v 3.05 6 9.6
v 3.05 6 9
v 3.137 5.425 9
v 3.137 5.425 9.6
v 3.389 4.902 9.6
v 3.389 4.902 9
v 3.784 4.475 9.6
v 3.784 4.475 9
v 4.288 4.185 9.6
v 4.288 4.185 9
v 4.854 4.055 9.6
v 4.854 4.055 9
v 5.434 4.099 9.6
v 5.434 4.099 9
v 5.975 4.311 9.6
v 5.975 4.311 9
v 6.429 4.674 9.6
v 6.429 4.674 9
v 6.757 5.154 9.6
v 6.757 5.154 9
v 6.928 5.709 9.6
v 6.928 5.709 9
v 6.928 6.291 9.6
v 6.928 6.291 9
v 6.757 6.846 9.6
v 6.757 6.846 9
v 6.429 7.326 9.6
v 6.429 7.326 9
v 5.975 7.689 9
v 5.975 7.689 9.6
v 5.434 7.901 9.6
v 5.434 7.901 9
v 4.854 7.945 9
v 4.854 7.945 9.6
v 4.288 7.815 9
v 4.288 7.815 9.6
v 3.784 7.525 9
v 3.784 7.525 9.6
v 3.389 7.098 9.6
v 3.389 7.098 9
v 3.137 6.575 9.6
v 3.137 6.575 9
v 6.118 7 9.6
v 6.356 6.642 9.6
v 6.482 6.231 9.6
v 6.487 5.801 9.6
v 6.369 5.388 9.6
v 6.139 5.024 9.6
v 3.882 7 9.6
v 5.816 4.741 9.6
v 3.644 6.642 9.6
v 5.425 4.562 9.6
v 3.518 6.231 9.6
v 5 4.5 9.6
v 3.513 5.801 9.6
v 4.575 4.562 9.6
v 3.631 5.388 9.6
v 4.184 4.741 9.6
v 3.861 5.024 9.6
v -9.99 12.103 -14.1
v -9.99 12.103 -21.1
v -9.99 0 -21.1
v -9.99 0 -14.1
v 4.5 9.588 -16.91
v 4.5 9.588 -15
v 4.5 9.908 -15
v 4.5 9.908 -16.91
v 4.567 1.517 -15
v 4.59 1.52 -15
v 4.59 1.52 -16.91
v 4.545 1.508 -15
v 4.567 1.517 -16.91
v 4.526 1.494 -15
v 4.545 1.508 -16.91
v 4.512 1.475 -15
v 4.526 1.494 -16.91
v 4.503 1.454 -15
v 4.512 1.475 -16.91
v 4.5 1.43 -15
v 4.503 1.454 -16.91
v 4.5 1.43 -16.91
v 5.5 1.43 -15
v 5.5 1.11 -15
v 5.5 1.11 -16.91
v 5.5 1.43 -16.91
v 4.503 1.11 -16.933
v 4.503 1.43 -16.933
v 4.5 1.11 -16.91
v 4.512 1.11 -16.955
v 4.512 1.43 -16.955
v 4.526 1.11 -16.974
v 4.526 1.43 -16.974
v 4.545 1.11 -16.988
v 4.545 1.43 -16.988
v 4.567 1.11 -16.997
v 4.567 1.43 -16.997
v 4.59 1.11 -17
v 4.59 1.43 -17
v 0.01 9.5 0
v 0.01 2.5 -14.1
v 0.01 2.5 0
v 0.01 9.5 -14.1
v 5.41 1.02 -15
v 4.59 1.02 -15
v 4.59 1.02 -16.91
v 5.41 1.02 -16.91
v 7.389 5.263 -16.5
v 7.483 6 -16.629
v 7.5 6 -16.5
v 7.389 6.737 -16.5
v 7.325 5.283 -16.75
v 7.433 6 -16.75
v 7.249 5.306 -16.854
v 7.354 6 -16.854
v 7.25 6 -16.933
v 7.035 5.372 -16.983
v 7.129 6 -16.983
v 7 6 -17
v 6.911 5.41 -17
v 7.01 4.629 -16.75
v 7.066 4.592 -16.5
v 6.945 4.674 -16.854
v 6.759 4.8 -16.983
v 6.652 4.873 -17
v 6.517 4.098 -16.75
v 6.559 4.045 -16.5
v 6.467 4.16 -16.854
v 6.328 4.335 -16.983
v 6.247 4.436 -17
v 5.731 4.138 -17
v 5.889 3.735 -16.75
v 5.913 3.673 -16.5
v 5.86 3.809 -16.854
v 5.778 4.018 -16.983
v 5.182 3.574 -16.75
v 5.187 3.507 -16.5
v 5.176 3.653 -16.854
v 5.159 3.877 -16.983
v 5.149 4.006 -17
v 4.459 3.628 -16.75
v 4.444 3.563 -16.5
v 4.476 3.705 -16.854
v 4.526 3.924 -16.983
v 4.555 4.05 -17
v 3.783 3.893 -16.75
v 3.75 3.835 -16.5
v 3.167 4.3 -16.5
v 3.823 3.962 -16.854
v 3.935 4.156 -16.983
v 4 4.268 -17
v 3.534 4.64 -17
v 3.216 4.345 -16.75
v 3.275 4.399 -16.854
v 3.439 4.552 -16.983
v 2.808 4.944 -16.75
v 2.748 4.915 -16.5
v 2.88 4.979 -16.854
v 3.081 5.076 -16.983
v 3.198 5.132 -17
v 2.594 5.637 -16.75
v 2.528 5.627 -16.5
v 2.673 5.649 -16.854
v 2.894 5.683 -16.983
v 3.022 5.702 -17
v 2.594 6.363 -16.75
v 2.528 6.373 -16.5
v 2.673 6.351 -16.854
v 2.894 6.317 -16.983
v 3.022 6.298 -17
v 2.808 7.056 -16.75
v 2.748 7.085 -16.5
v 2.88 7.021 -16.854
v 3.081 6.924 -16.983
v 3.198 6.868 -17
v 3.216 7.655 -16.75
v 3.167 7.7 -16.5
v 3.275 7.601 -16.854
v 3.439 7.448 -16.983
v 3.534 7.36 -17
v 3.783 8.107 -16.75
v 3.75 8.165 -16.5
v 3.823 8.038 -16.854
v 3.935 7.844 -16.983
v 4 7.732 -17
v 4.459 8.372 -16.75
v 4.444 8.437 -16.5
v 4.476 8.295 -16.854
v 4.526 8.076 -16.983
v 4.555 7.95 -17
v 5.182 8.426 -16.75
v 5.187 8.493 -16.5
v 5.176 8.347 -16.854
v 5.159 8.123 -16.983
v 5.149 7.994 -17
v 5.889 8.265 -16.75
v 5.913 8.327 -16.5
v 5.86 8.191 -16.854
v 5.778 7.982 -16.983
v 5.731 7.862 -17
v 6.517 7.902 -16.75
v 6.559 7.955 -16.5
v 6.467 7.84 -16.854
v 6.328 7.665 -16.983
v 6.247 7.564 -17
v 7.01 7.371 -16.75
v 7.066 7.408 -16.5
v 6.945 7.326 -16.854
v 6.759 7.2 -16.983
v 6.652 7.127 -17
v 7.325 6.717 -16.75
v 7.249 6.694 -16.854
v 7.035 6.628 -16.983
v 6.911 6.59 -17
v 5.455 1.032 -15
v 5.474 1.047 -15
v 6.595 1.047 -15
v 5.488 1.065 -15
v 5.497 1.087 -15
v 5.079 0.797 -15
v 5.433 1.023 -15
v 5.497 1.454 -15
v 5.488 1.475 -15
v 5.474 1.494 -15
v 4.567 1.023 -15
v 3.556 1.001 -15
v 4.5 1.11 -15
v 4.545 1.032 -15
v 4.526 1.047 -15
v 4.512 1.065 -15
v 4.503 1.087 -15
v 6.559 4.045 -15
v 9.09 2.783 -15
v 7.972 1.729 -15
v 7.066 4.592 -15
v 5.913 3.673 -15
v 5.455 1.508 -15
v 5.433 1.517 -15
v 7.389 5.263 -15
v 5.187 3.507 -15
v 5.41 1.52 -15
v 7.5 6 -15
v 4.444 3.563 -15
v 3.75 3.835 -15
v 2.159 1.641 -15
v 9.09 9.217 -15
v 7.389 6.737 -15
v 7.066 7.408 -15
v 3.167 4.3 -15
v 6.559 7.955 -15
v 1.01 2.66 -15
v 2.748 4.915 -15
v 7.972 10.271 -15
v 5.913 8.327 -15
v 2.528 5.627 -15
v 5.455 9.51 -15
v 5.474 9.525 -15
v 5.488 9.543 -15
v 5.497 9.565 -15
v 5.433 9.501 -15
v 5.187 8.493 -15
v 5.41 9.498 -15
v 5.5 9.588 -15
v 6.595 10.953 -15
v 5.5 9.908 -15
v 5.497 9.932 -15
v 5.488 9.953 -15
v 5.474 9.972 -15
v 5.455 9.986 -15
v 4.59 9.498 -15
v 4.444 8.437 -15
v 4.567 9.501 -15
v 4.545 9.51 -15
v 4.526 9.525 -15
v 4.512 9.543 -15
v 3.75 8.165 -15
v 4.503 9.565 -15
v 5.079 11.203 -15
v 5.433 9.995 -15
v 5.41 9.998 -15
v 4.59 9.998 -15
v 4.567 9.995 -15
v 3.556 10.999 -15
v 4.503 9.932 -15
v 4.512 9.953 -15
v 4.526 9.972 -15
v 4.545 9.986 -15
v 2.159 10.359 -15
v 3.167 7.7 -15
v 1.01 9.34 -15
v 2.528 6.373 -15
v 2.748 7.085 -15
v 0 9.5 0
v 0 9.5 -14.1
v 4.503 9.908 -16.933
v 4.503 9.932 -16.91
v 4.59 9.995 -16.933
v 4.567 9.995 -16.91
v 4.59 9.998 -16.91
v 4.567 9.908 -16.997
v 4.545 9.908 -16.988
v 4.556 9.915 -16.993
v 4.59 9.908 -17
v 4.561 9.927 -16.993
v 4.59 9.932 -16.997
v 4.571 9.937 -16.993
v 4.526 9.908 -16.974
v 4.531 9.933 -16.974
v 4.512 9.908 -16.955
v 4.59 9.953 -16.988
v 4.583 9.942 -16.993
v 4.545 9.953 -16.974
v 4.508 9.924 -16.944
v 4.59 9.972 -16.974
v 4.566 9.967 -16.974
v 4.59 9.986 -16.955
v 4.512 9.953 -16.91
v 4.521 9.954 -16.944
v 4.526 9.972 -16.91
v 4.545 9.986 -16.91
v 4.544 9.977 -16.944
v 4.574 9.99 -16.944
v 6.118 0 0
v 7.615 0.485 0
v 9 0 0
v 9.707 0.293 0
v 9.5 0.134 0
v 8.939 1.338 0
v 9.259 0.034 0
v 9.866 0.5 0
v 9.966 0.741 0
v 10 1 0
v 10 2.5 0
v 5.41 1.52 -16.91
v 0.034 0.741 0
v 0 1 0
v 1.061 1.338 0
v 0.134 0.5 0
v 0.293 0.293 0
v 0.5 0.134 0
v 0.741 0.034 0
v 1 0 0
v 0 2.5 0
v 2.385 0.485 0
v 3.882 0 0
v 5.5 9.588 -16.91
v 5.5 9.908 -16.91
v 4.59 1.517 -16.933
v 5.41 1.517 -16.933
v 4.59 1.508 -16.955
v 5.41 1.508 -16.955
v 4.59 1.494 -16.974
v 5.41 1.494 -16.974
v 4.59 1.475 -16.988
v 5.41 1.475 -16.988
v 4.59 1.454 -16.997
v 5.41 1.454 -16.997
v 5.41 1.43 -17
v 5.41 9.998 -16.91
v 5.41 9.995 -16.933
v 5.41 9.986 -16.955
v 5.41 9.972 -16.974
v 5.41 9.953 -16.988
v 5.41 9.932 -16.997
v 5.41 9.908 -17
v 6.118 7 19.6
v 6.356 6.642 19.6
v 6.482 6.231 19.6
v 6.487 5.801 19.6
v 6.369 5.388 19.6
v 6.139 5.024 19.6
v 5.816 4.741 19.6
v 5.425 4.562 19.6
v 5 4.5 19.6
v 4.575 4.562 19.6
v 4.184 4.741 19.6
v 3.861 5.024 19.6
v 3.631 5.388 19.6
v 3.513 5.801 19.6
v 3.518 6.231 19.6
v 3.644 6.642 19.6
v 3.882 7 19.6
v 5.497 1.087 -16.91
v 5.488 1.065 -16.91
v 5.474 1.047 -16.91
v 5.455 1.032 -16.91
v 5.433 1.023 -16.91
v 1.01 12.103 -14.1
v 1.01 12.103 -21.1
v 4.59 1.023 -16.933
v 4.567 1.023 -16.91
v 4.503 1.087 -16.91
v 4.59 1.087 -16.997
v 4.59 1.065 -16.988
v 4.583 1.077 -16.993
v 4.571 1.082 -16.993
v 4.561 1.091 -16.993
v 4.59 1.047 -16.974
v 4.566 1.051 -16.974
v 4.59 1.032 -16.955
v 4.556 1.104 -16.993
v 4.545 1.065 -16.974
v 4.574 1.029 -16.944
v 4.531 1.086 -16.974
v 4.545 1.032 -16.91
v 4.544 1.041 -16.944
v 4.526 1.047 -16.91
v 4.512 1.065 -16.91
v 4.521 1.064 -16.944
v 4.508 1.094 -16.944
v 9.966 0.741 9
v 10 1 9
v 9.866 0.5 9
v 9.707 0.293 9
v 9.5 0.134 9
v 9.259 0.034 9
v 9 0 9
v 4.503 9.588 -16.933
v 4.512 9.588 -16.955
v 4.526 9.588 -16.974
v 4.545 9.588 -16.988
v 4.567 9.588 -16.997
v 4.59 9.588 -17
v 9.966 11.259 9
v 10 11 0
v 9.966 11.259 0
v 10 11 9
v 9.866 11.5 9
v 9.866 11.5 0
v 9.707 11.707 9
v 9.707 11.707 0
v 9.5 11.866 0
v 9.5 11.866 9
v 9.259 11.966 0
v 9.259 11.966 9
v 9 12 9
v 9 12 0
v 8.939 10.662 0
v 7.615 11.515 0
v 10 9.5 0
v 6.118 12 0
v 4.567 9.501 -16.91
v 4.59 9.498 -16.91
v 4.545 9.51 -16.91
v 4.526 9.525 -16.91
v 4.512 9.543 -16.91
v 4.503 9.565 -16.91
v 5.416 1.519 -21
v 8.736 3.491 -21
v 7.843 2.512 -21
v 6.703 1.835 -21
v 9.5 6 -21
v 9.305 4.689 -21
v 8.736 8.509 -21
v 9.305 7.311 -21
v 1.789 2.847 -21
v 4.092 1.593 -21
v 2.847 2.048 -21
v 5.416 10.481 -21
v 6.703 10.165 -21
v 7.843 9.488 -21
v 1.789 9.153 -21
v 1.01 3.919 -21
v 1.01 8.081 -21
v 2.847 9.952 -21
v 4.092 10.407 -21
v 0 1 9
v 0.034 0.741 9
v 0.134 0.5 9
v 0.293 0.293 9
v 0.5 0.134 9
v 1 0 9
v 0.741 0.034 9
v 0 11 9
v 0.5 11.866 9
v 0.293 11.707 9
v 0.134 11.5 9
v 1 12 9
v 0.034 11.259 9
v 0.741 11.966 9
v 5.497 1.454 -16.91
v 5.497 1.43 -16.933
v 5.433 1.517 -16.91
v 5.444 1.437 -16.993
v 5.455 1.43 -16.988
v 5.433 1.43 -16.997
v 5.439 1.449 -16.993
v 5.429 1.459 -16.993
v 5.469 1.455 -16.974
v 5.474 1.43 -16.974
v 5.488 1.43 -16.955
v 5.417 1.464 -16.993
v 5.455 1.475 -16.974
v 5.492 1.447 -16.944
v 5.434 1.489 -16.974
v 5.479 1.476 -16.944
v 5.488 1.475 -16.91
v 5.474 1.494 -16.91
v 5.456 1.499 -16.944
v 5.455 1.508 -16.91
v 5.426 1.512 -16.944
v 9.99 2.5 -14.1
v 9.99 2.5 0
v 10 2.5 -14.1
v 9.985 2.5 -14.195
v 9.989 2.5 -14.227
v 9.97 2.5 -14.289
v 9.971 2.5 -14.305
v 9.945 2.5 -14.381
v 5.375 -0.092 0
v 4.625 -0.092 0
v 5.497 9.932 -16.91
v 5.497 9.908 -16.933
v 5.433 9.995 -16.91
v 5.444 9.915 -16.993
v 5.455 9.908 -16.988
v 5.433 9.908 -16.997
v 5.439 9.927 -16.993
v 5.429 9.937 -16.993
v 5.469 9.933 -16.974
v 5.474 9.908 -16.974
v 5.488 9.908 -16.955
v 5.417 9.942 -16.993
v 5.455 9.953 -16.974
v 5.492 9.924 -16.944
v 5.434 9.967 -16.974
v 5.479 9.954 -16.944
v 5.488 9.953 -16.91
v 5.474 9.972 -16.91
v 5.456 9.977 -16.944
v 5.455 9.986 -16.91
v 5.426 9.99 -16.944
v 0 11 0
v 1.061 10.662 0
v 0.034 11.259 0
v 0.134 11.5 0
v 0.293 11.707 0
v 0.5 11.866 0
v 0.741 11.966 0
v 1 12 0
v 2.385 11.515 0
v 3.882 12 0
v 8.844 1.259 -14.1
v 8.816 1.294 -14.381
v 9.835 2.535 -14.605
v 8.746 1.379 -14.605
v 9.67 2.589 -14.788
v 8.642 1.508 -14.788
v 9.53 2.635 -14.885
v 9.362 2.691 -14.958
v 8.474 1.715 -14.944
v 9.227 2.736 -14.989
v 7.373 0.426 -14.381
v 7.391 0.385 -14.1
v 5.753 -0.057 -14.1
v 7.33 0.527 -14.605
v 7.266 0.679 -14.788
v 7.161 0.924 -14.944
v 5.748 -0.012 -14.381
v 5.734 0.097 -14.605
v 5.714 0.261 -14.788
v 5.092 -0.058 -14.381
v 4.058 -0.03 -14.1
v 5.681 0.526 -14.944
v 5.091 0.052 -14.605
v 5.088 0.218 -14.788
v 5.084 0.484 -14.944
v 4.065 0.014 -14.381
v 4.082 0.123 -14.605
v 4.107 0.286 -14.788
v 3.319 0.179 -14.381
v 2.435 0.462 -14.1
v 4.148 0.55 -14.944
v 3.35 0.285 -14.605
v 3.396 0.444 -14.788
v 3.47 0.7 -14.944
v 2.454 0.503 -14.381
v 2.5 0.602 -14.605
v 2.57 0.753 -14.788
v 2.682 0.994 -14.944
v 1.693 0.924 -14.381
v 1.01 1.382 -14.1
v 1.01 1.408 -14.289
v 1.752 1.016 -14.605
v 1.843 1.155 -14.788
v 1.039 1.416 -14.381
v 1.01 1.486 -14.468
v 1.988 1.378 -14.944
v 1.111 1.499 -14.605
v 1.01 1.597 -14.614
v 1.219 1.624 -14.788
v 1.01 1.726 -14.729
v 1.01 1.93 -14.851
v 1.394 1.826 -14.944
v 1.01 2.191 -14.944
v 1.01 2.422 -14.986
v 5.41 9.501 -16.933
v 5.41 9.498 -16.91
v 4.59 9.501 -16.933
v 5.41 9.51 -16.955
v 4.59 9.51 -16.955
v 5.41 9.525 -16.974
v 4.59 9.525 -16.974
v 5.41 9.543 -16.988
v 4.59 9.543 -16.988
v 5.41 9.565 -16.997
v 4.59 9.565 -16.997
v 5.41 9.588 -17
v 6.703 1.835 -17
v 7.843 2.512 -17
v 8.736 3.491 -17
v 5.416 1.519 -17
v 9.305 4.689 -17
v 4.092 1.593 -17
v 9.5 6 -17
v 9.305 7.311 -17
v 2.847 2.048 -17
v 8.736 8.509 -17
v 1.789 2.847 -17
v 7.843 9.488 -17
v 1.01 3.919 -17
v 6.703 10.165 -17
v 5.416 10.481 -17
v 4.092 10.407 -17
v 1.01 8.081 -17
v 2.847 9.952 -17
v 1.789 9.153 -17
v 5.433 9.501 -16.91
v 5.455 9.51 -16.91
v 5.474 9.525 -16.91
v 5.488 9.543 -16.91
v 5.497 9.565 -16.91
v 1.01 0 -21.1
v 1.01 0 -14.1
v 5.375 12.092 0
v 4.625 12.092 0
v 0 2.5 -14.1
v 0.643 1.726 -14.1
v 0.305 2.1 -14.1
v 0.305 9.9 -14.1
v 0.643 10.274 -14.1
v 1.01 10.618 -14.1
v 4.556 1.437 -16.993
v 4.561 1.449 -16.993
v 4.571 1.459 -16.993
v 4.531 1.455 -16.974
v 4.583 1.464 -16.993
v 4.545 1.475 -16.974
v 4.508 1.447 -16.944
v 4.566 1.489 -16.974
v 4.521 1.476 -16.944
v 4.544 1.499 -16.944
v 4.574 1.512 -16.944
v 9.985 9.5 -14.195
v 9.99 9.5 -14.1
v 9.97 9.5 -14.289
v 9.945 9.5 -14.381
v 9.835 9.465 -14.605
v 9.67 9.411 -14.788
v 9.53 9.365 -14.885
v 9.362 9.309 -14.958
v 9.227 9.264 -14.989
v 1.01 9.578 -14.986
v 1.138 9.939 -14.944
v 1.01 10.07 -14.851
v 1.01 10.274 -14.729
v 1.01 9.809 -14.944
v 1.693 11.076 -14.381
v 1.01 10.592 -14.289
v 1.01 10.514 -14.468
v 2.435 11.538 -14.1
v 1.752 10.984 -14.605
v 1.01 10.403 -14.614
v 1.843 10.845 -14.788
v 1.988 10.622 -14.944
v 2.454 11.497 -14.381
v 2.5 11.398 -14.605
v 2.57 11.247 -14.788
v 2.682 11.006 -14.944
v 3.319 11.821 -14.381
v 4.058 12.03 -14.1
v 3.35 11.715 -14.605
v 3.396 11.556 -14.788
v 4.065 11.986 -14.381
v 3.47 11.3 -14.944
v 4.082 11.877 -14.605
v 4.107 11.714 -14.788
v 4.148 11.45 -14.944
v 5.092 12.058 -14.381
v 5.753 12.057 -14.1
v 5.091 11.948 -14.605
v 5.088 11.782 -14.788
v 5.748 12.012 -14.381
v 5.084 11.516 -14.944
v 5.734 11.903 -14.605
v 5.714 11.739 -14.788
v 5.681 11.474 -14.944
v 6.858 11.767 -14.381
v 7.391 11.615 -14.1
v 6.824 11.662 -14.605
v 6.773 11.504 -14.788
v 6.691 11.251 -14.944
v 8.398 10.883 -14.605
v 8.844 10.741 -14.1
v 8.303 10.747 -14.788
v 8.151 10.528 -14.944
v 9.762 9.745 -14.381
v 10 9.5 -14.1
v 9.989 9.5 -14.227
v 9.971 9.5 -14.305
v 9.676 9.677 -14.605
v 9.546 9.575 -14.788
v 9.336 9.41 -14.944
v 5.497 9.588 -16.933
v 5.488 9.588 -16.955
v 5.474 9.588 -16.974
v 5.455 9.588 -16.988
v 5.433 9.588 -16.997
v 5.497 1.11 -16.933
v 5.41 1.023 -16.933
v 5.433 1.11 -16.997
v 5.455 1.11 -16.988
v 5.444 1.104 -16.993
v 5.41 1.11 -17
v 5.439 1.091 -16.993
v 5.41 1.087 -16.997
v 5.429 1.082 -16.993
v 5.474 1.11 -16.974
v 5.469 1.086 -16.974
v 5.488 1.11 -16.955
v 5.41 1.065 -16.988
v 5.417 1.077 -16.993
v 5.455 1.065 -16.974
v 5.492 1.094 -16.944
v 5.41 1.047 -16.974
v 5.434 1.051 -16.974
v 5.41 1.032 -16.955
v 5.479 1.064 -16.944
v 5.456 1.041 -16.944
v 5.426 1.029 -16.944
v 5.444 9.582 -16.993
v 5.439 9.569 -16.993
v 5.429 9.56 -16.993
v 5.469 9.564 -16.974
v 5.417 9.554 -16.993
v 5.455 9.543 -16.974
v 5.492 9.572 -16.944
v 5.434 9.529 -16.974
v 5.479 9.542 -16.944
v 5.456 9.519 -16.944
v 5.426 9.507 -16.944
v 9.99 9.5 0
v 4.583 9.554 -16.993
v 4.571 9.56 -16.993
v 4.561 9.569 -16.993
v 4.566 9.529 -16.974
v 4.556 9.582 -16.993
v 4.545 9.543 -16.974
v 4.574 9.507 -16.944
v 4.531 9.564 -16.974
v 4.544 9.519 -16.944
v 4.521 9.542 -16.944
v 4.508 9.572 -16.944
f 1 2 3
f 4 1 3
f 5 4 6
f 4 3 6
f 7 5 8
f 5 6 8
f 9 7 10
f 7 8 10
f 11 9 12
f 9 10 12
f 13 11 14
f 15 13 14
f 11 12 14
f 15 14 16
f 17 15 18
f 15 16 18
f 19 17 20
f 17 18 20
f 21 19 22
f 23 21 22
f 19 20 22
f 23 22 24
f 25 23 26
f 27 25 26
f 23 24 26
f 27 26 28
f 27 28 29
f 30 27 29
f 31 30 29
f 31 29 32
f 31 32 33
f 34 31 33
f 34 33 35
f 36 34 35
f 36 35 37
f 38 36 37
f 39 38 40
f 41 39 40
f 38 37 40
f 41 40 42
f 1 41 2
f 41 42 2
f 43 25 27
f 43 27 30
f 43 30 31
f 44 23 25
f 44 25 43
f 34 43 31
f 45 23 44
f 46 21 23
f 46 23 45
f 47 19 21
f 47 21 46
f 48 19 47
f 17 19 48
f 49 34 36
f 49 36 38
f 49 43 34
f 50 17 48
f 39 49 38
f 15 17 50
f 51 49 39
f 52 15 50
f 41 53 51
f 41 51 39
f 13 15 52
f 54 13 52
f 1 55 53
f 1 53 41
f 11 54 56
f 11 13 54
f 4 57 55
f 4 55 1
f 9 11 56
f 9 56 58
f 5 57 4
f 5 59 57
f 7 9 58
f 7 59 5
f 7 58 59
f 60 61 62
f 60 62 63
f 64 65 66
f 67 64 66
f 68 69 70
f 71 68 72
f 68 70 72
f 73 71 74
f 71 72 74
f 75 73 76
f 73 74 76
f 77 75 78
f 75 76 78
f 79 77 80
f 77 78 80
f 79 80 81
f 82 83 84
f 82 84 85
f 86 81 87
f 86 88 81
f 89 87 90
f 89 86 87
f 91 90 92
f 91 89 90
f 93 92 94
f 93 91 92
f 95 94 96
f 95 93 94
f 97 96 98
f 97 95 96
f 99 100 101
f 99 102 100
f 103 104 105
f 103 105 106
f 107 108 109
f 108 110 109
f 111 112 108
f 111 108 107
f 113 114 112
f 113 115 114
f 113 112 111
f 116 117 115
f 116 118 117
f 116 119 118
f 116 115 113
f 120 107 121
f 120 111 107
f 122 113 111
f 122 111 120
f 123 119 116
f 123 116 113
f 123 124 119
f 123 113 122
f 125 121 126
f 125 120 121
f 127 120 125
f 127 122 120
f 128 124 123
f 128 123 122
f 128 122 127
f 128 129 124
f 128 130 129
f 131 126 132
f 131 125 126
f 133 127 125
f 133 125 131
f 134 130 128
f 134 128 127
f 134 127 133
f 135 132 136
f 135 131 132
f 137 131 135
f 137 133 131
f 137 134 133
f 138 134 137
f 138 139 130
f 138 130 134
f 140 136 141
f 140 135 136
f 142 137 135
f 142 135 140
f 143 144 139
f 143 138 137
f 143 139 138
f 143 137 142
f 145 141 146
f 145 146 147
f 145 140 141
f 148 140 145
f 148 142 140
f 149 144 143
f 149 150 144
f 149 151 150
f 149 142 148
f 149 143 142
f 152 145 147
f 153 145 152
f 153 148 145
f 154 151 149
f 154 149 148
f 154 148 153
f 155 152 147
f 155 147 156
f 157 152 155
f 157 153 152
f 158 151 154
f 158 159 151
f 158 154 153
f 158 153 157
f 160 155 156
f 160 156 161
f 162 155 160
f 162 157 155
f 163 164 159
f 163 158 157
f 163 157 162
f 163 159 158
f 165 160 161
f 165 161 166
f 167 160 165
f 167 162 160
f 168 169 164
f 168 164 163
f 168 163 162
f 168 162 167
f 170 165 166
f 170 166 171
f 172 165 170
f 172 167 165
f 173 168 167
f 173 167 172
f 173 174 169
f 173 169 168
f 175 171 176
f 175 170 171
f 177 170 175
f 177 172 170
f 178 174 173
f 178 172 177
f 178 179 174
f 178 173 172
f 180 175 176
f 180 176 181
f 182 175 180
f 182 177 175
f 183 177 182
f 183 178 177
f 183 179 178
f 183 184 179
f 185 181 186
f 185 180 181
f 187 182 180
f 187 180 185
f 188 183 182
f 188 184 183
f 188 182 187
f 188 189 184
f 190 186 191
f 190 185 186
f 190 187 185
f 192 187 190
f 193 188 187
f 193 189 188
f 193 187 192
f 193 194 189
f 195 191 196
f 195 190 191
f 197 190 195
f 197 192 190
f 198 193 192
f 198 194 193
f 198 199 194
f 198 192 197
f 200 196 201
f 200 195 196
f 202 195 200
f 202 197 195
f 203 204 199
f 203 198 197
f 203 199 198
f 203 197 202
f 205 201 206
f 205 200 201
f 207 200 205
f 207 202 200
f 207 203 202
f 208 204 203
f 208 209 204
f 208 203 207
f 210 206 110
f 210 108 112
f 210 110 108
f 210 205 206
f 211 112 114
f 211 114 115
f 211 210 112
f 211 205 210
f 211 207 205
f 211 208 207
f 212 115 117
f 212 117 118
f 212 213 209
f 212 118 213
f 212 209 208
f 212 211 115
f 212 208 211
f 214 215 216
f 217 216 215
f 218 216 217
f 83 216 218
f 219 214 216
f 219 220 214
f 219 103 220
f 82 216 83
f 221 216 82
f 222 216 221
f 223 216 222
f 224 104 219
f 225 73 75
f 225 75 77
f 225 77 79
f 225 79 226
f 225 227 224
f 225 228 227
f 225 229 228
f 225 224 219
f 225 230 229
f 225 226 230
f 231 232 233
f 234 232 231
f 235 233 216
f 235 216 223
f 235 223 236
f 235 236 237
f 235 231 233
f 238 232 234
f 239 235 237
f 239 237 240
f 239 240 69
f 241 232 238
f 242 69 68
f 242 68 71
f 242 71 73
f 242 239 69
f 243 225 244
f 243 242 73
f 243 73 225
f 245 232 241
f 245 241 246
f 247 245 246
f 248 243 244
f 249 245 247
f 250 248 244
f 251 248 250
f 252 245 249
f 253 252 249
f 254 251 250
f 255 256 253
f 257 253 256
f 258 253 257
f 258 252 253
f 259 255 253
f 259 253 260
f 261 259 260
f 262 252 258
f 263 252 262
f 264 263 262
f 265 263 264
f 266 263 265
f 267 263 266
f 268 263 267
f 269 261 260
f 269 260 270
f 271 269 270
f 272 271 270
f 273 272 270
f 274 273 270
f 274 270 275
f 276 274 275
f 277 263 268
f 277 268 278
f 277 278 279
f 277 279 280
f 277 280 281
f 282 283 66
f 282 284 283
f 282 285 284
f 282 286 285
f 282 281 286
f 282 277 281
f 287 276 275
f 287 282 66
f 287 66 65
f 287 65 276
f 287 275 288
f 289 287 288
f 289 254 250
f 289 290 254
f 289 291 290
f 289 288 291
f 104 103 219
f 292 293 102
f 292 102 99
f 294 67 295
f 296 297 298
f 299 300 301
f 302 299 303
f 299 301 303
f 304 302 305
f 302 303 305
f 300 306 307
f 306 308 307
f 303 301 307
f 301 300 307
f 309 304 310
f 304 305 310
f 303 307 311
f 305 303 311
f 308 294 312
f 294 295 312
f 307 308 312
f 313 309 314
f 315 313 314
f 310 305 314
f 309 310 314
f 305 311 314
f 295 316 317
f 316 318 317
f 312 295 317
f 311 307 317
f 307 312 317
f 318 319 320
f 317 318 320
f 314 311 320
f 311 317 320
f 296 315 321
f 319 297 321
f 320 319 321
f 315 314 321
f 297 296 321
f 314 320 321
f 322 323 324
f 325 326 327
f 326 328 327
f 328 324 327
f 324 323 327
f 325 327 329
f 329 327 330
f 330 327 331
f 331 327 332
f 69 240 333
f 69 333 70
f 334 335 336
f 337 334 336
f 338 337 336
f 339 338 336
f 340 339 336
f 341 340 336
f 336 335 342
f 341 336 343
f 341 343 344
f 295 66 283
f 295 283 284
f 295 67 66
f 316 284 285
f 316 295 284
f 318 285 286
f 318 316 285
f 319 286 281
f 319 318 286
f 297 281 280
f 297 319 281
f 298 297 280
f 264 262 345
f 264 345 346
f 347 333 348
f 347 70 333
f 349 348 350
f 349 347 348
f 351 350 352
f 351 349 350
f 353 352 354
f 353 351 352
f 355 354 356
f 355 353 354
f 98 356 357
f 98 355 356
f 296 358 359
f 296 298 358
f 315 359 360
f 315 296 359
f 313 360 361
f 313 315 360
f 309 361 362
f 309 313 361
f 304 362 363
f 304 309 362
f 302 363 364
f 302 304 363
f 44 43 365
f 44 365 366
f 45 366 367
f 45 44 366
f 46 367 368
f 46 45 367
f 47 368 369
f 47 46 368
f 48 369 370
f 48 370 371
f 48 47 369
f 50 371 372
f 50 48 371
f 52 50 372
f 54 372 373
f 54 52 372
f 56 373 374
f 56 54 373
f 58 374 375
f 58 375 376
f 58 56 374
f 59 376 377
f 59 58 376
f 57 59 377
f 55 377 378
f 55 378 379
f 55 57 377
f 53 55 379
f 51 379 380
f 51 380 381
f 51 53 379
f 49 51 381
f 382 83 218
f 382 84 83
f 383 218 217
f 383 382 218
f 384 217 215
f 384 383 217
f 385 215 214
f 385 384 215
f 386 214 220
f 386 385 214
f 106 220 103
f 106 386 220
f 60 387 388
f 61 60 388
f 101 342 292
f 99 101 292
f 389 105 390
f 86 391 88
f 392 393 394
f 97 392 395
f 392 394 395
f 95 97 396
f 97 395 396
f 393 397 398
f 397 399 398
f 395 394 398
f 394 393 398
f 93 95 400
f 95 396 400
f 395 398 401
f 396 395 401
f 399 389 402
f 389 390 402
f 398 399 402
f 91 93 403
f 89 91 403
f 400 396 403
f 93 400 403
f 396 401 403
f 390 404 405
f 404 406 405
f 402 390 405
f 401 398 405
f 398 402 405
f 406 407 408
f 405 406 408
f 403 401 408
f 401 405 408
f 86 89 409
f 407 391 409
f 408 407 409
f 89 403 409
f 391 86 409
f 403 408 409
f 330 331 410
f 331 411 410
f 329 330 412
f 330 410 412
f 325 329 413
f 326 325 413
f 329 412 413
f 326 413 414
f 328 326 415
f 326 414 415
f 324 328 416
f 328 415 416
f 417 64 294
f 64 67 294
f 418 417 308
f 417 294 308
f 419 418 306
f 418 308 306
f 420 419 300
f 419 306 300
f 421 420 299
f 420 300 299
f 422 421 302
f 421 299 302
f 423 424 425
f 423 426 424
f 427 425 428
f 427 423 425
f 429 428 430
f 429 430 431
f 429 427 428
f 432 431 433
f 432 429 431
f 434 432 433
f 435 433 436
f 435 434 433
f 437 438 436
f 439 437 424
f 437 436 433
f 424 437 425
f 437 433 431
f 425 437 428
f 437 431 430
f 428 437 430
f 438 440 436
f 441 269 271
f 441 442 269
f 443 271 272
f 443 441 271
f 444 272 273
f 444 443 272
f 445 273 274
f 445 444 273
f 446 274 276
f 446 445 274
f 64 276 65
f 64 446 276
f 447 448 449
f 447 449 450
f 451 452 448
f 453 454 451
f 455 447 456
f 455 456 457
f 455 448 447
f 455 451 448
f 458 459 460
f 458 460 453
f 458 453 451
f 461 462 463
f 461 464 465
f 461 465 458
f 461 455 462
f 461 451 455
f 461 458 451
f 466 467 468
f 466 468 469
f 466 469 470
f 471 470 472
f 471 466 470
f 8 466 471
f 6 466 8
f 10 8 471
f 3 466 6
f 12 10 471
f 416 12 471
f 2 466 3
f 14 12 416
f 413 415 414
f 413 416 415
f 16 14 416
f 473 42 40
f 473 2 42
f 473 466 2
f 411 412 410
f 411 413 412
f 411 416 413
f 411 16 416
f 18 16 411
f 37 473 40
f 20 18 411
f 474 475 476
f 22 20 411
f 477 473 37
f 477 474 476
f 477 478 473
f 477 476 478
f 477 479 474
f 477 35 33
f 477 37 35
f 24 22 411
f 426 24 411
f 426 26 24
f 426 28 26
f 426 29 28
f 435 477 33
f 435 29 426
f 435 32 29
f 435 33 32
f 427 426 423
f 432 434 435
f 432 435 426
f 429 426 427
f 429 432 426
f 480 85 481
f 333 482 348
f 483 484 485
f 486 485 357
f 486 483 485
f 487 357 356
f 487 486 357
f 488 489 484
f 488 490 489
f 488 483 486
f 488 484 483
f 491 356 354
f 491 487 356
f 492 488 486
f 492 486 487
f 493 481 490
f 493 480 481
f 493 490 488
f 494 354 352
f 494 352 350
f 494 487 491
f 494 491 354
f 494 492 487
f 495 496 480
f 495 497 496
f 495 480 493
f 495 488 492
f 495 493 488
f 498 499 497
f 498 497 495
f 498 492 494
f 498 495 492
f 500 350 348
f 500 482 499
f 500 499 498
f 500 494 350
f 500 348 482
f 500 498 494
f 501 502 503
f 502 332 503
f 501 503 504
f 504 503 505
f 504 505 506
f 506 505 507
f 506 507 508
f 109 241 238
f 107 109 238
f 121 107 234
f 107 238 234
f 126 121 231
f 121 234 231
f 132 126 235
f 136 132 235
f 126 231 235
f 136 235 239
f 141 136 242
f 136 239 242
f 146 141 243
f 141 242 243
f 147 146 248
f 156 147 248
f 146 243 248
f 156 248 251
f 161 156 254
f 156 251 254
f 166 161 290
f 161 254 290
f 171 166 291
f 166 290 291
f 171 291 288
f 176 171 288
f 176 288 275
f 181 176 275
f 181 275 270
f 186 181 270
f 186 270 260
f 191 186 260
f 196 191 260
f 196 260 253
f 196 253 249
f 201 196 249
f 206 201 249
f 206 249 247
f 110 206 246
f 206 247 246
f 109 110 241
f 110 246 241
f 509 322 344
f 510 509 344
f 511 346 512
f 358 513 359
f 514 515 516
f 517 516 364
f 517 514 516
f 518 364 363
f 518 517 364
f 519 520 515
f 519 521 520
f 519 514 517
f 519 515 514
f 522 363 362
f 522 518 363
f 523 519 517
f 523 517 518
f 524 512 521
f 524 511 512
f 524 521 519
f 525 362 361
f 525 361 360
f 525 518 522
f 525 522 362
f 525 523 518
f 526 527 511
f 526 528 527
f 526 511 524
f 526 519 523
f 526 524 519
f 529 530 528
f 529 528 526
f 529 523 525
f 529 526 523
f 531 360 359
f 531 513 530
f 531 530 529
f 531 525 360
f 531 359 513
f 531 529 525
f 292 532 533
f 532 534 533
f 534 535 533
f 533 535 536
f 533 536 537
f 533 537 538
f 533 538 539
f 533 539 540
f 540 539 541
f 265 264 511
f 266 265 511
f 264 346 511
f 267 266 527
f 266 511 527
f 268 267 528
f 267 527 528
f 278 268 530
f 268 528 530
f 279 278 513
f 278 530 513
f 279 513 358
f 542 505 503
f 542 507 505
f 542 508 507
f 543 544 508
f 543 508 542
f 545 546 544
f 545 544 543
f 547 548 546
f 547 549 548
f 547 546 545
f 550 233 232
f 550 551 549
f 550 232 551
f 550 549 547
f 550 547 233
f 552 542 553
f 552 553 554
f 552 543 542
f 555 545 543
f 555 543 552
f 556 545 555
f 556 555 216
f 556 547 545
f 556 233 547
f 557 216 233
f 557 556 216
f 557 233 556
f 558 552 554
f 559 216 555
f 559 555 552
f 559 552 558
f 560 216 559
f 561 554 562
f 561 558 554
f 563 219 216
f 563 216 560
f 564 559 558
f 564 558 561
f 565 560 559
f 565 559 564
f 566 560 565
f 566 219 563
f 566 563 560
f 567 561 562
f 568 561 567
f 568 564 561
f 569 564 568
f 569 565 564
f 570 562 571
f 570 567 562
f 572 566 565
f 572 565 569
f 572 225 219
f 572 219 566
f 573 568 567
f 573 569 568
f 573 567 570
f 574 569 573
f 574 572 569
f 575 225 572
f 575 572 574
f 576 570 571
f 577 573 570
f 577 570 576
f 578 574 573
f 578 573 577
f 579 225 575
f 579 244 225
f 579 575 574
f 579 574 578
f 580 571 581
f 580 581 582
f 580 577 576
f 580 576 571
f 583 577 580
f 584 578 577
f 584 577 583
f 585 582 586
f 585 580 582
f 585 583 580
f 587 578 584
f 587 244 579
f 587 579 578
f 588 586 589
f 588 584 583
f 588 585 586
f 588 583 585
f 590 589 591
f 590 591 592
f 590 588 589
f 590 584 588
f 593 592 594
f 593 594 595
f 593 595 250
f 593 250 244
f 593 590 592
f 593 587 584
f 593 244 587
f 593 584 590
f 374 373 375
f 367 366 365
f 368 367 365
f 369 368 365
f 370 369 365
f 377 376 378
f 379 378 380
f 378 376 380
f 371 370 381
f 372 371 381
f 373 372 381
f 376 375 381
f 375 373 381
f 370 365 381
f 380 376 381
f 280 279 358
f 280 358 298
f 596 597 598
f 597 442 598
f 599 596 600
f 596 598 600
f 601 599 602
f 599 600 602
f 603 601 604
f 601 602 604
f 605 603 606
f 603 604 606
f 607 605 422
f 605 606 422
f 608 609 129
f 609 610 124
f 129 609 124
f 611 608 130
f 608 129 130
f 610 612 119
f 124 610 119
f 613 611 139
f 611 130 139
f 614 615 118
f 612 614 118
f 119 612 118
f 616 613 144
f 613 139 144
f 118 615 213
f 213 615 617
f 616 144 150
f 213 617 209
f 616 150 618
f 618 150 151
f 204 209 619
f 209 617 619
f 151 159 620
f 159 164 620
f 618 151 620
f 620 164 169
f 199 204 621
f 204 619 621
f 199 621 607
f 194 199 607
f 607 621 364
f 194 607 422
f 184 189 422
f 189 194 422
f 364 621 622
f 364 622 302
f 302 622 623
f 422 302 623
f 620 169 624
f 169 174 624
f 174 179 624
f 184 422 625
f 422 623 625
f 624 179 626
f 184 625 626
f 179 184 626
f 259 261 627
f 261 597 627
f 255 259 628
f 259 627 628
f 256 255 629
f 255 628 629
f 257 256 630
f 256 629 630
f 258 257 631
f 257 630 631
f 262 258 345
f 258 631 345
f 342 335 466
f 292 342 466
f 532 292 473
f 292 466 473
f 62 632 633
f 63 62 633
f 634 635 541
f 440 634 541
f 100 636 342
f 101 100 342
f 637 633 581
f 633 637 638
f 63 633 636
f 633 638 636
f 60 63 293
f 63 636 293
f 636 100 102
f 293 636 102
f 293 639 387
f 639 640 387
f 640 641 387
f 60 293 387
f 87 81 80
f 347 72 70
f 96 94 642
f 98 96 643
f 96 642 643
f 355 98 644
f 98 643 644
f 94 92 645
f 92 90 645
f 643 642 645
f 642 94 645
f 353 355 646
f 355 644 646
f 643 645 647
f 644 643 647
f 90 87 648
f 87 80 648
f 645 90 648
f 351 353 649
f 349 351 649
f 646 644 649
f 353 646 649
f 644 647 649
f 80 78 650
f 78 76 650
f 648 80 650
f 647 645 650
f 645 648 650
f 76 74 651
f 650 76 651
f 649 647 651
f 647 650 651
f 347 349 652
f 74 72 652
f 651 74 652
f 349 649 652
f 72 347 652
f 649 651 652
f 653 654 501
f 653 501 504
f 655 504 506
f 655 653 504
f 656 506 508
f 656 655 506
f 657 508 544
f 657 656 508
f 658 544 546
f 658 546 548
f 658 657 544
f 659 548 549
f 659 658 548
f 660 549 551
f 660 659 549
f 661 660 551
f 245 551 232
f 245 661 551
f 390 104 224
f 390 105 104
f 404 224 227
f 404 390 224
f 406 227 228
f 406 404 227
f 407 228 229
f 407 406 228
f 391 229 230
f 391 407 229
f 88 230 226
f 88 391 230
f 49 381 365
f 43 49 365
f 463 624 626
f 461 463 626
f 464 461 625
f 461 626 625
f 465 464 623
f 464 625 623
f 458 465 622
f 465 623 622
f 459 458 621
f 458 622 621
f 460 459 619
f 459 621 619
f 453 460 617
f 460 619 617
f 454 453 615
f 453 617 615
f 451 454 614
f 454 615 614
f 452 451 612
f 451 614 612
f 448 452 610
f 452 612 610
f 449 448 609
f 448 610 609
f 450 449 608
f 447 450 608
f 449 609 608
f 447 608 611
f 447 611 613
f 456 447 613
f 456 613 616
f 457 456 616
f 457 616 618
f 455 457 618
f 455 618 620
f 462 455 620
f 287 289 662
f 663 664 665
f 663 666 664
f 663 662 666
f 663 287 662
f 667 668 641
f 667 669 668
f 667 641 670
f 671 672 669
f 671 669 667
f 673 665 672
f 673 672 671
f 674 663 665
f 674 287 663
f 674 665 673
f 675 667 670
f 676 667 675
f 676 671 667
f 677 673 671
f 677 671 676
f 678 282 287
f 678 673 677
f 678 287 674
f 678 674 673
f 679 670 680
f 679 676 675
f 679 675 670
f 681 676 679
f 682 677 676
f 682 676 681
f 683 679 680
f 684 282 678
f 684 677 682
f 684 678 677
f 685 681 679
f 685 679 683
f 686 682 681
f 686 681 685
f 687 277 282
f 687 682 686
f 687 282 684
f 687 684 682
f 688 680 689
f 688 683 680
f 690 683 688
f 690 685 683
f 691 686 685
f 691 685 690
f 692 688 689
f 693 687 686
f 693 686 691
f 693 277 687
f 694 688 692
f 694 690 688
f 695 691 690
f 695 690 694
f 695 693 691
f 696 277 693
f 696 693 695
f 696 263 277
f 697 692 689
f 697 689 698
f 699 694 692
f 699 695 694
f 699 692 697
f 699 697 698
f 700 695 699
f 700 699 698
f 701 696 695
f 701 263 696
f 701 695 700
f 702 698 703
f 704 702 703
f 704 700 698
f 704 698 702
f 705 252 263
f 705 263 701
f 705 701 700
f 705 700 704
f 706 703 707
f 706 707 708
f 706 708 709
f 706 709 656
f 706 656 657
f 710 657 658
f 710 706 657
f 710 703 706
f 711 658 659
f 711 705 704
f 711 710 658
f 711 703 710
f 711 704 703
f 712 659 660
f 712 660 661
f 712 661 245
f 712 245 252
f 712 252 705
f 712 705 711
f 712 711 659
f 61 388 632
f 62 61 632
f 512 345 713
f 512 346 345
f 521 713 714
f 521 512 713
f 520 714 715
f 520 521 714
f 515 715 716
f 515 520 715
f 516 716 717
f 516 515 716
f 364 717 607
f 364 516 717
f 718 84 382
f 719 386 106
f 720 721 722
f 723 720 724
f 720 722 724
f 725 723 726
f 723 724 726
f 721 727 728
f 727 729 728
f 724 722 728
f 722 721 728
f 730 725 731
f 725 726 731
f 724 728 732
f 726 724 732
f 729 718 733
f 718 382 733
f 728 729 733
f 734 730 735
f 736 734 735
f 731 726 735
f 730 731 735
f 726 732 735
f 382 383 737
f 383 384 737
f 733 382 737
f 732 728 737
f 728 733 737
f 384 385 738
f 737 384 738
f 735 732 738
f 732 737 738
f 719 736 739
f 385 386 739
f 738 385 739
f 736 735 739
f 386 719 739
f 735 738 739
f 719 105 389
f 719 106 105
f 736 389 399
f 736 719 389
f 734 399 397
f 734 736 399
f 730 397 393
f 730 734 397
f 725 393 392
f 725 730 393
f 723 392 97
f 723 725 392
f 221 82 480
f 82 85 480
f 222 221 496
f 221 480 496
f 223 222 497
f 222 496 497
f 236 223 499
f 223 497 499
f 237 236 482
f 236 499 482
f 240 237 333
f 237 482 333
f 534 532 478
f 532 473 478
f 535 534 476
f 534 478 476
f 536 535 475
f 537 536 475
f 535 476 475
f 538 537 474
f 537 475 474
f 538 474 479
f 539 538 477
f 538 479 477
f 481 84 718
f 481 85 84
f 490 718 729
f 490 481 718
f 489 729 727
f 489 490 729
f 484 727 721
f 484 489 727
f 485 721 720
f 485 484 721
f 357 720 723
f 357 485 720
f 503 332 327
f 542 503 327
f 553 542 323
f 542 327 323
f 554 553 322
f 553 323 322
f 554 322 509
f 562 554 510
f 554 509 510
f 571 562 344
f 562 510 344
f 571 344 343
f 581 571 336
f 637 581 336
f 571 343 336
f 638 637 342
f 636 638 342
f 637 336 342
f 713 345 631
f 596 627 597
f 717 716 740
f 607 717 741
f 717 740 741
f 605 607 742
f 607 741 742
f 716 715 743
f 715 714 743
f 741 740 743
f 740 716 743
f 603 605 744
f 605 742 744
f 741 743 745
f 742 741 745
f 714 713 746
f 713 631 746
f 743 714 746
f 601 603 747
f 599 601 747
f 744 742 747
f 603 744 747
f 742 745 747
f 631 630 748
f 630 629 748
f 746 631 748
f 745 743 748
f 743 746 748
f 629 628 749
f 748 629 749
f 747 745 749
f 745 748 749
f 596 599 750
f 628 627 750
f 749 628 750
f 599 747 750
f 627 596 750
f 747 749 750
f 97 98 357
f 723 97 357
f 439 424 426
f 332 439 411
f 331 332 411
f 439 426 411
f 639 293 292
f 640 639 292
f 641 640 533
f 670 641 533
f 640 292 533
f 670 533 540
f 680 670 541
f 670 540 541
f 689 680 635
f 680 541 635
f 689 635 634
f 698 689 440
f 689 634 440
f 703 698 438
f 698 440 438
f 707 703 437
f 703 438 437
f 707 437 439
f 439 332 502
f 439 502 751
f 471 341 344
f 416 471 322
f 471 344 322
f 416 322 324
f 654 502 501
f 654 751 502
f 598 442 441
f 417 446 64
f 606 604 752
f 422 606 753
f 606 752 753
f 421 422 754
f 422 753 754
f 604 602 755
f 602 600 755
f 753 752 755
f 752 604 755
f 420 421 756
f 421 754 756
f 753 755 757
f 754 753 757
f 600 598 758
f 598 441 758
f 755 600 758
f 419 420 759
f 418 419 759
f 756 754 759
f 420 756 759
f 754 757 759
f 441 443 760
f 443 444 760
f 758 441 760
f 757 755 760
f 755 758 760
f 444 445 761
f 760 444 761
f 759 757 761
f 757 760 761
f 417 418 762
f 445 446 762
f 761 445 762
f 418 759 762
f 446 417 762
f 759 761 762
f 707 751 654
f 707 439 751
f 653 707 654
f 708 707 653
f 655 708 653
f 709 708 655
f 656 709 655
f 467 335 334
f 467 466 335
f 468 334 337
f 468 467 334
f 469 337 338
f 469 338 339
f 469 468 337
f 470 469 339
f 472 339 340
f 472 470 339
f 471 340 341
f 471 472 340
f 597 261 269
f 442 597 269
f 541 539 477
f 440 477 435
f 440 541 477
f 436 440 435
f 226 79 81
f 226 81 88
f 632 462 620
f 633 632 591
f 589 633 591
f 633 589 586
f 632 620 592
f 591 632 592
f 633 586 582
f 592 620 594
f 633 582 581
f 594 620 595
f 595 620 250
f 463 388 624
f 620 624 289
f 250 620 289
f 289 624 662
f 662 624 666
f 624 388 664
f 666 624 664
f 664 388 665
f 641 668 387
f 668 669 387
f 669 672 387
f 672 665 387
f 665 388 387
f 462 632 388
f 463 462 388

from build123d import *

# Parameters (mm, degrees)
CROQUIS1_W               = 10
CROQUIS1_H               = 12
SALIENTE_EXTRUIR1_DEPTH  = 9
SALIENTE_EXTRUIR2_DEPTH  = 15
CROQUIS3_W               = 1
CROQUIS3_H               = 0.5
SALIENTE_EXTRUIR3_DEPTH  = 2
CROQUIS4_R               = 2.5000000000000004
SALIENTE_EXTRUIR4_DEPTH  = 2
CROQUIS5_R               = 1.95
SALIENTE_EXTRUIR5_DEPTH  = 0.6
SALIENTE_EXTRUIR9_DEPTH  = 10
CROQUIS7_W               = 15.000000000000002
CROQUIS7_H               = 7.000000000000002
CORTAR_EXTRUIR1_DEPTH    = 0.01
CROQUIS8_W               = 15.000000000000002
CROQUIS8_H               = 7.0000000000000036
CORTAR_EXTRUIR2_DEPTH    = 0.01
REDONDEO1_R              = 0.9
REDONDEO2_R              = 0.9
REDONDEO3_R              = 0.5
CROQUIS9_R               = 0.4628353533662974
SALIENTE_EXTRUIR7_DEPTH  = 0.01
REDONDEO4_R              = 0.09
REDONDEO6_R              = 1
SKETCH2_R                = 4.5
BOSS_EXTRUDE1_DEPTH      = 4
BOSS_EXTRUDE3_DEPTH      = 10
BOSS_EXTRUDE3_DEPTH_BACK = 1


with BuildPart() as part:
    # Croquis1 → Saliente-Extruir1 (new body)
    with BuildSketch(Plane.XY):
        with Locations((5, 6)):
            Rectangle(CROQUIS1_W, CROQUIS1_H)
    extrude(amount=SALIENTE_EXTRUIR1_DEPTH)

    # Croquis2 → Saliente-Extruir2 (add)
    with BuildSketch(Plane(origin=(0, 0, 0), x_dir=(-1, 0, 0), z_dir=(0, 0, -1))):
        with BuildLine():
            Line((-10, 9.5), (-10, 2.5))
            ThreePointArc((-10, 2.5), (-5, -0.10327780786685103), (0, 2.5000000000000004))
            Line((0, 2.5000000000000004), (0, 9.5))
            ThreePointArc((0, 9.5), (-5, 12.103277807866851), (-10, 9.5))
        make_face()
    extrude(amount=SALIENTE_EXTRUIR2_DEPTH)

    # Croquis3 → Saliente-Extruir3 (add)
    with BuildSketch(Plane(origin=(0, 0, -15), x_dir=(-1, 0, 0), z_dir=(0, 0, -1))):
        with Locations((-5.000000000000001, 9.748277807866852)):
            Rectangle(CROQUIS3_W, CROQUIS3_H)
        Polygon((-5.499999999999999, 1.520287769635288), (-4.499999999999999, 1.5202877696352886), (-4.499999999999999, 1.020287769635288), (-5.499999999999999, 1.020287769635288), align=None)
    extrude(amount=SALIENTE_EXTRUIR3_DEPTH)

    # Croquis4 → Saliente-Extruir4 (add)
    with BuildSketch(Plane(origin=(0, 0, -15), x_dir=(-1, 0, 0), z_dir=(0, 0, -1))):
        with Locations(Location((-5, 6, 0), (0, 0, 180))):
            Circle(CROQUIS4_R)
    extrude(amount=SALIENTE_EXTRUIR4_DEPTH)

    # Croquis5 → Saliente-Extruir5 (add)
    with BuildSketch(Plane.XY.offset(9)):
        with Locations(Location((5, 6, 0), (0, 0, 180))):
            Circle(CROQUIS5_R)
    extrude(amount=SALIENTE_EXTRUIR5_DEPTH)

    # Croquis6 → Saliente-Extruir9 (add)
    with BuildSketch(Plane.XY.offset(9.6)):
        with BuildLine():
            Line((3.8819660112501033, 6.999999999999999), (6.118033988749897, 6.999999999999999))
            ThreePointArc((6.118033988749897, 6.999999999999999), (5, 4.499999999999999), (3.8819660112501033, 6.999999999999999))
        make_face()
    extrude(amount=SALIENTE_EXTRUIR9_DEPTH)

    # Croquis7 → Cortar-Extruir1 (cut)
    with BuildSketch(Plane(origin=(10, 0, 0), x_dir=(0, 0, -1), z_dir=(1, 0, 0))):
        with Locations((7.500000000000001, 5.999999999999999)):
            Rectangle(CROQUIS7_W, CROQUIS7_H)
    extrude(amount=-CORTAR_EXTRUIR1_DEPTH, mode=Mode.SUBTRACT)

    # Croquis8 → Cortar-Extruir2 (cut)
    with BuildSketch(Plane.ZY):
        with Locations((-7.500000000000001, 5.999999999999998)):
            Rectangle(CROQUIS8_W, CROQUIS8_H)
    extrude(amount=-CORTAR_EXTRUIR2_DEPTH, mode=Mode.SUBTRACT)

    # Redondeo1
    redondeo1_edges = [part.edges().sort_by_distance(p)[0] for p in [
        (9.99, 6, -15),
        (0.01, 5.999999999999998, -15),
    ]]
    fillet(redondeo1_edges, radius=REDONDEO1_R)

    # Redondeo2
    # the kernel refuses this fillet: 0.9 mm, written as the material it takes off along each edge
    with BuildSketch(Plane(origin=(5, 6.000000000000001, -15), x_dir=(-0.9708964954680348, 0.23949946782381015, 0), z_dir=(-0.23949946782381015, -0.9708964954680348, 0))) as redondeo2_piece_1:
        with BuildLine():
            CenterArc((6.103277807866849 - REDONDEO2_R, -REDONDEO2_R), REDONDEO2_R, 0, 90)
            Line((6.103277807866849, -REDONDEO2_R), (6.103277807866849, 0))
            Line((6.103277807866849, 0), (6.103277807866849 - REDONDEO2_R, 0))
        make_face()
    revolve(axis=Axis((5, 6.000000000000001, -15), (0, 0, -1)), revolution_arc=152.28599911771772, mode=Mode.SUBTRACT)
    with BuildSketch(Plane(origin=(5, 6, -15), x_dir=(0.9708964954680347, -0.23949946782381032, 0), z_dir=(0.23949946782381032, 0.9708964954680347, 0))) as redondeo2_piece_2:
        with BuildLine():
            CenterArc((6.103277807866849 - REDONDEO2_R, -REDONDEO2_R), REDONDEO2_R, 0, 90)
            Line((6.103277807866849 - REDONDEO2_R, 0), (6.103277807866849, 0))
            Line((6.103277807866849, 0), (6.103277807866849, -REDONDEO2_R))
        make_face()
    revolve(axis=Axis((5, 6, -15), (0, 0, -1)), revolution_arc=152.2859991177177, mode=Mode.SUBTRACT)

    # Redondeo3
    redondeo3_edges = [part.edges().sort_by_distance(p)[0] for p in [
        (2.4999999999999996, 5.999999999999999, -17),
    ]]
    fillet(redondeo3_edges, radius=REDONDEO3_R)

    # Croquis9 → Saliente-Extruir7 (add)
    with BuildSketch(Plane(origin=(0, 0, -17), x_dir=(-1, 0, 0), z_dir=(0, 0, -1))):
        with Locations((-5, 6)):
            Circle(CROQUIS9_R)
    extrude(amount=SALIENTE_EXTRUIR7_DEPTH)

    # Redondeo4
    redondeo4_edges = [part.edges().sort_by_distance(p)[0] for p in [
        (5.500000000000001, 9.998277807866852, -16),
        (5.500000000000001, 9.498277807866852, -16),
        (4.500000000000001, 9.498277807866852, -16),
        (4.500000000000001, 9.998277807866852, -16),
        (5.500000000000001, 9.748277807866852, -17),
        (5.000000000000001, 9.498277807866852, -17),
        (4.500000000000001, 9.748277807866852, -17),
        (5.000000000000001, 9.998277807866852, -17),
        (5.499999999999999, 1.520287769635288, -16),
        (5.499999999999999, 1.020287769635288, -16),
        (4.499999999999999, 1.020287769635288, -16),
        (4.499999999999999, 1.5202877696352886, -16),
        (5.499999999999999, 1.270287769635288, -17),
        (4.999999999999999, 1.020287769635288, -17),
        (4.499999999999999, 1.2702877696352883, -17),
        (4.999999999999999, 1.5202877696352883, -17),
    ]]
    fillet(redondeo4_edges, radius=REDONDEO4_R)

    # Redondeo6
    redondeo6_edges = [part.edges().sort_by_distance(p)[0] for p in [
        (10, 12, 4.5),
        (10, 0, 4.5),
        (0, 0, 4.5),
        (0, 12, 4.5),
    ]]
    fillet(redondeo6_edges, radius=REDONDEO6_R)

    # Sketch2 → Boss-Extrude1 (add)
    with BuildSketch(Plane(origin=(0, 0, -17), x_dir=(-1, 0, 0), z_dir=(0, 0, -1))):
        with Locations((-5, 6)):
            Circle(SKETCH2_R)
    extrude(amount=BOSS_EXTRUDE1_DEPTH)

    # Sketch3 → Boss-Extrude3 (add, two sides: drawn at the far end of the back side and taken through both)
    with BuildSketch(Plane.ZY.offset(-0.01).offset(-BOSS_EXTRUDE3_DEPTH_BACK)):
        Polygon((-14.100000000000003, 12.103277807866851), (-21.100000000000005, 12.103277807866851), (-21.1, 0), (-14.100000000000003, 0), align=None)
    extrude(amount=BOSS_EXTRUDE3_DEPTH + BOSS_EXTRUDE3_DEPTH_BACK)


solid = part.part
